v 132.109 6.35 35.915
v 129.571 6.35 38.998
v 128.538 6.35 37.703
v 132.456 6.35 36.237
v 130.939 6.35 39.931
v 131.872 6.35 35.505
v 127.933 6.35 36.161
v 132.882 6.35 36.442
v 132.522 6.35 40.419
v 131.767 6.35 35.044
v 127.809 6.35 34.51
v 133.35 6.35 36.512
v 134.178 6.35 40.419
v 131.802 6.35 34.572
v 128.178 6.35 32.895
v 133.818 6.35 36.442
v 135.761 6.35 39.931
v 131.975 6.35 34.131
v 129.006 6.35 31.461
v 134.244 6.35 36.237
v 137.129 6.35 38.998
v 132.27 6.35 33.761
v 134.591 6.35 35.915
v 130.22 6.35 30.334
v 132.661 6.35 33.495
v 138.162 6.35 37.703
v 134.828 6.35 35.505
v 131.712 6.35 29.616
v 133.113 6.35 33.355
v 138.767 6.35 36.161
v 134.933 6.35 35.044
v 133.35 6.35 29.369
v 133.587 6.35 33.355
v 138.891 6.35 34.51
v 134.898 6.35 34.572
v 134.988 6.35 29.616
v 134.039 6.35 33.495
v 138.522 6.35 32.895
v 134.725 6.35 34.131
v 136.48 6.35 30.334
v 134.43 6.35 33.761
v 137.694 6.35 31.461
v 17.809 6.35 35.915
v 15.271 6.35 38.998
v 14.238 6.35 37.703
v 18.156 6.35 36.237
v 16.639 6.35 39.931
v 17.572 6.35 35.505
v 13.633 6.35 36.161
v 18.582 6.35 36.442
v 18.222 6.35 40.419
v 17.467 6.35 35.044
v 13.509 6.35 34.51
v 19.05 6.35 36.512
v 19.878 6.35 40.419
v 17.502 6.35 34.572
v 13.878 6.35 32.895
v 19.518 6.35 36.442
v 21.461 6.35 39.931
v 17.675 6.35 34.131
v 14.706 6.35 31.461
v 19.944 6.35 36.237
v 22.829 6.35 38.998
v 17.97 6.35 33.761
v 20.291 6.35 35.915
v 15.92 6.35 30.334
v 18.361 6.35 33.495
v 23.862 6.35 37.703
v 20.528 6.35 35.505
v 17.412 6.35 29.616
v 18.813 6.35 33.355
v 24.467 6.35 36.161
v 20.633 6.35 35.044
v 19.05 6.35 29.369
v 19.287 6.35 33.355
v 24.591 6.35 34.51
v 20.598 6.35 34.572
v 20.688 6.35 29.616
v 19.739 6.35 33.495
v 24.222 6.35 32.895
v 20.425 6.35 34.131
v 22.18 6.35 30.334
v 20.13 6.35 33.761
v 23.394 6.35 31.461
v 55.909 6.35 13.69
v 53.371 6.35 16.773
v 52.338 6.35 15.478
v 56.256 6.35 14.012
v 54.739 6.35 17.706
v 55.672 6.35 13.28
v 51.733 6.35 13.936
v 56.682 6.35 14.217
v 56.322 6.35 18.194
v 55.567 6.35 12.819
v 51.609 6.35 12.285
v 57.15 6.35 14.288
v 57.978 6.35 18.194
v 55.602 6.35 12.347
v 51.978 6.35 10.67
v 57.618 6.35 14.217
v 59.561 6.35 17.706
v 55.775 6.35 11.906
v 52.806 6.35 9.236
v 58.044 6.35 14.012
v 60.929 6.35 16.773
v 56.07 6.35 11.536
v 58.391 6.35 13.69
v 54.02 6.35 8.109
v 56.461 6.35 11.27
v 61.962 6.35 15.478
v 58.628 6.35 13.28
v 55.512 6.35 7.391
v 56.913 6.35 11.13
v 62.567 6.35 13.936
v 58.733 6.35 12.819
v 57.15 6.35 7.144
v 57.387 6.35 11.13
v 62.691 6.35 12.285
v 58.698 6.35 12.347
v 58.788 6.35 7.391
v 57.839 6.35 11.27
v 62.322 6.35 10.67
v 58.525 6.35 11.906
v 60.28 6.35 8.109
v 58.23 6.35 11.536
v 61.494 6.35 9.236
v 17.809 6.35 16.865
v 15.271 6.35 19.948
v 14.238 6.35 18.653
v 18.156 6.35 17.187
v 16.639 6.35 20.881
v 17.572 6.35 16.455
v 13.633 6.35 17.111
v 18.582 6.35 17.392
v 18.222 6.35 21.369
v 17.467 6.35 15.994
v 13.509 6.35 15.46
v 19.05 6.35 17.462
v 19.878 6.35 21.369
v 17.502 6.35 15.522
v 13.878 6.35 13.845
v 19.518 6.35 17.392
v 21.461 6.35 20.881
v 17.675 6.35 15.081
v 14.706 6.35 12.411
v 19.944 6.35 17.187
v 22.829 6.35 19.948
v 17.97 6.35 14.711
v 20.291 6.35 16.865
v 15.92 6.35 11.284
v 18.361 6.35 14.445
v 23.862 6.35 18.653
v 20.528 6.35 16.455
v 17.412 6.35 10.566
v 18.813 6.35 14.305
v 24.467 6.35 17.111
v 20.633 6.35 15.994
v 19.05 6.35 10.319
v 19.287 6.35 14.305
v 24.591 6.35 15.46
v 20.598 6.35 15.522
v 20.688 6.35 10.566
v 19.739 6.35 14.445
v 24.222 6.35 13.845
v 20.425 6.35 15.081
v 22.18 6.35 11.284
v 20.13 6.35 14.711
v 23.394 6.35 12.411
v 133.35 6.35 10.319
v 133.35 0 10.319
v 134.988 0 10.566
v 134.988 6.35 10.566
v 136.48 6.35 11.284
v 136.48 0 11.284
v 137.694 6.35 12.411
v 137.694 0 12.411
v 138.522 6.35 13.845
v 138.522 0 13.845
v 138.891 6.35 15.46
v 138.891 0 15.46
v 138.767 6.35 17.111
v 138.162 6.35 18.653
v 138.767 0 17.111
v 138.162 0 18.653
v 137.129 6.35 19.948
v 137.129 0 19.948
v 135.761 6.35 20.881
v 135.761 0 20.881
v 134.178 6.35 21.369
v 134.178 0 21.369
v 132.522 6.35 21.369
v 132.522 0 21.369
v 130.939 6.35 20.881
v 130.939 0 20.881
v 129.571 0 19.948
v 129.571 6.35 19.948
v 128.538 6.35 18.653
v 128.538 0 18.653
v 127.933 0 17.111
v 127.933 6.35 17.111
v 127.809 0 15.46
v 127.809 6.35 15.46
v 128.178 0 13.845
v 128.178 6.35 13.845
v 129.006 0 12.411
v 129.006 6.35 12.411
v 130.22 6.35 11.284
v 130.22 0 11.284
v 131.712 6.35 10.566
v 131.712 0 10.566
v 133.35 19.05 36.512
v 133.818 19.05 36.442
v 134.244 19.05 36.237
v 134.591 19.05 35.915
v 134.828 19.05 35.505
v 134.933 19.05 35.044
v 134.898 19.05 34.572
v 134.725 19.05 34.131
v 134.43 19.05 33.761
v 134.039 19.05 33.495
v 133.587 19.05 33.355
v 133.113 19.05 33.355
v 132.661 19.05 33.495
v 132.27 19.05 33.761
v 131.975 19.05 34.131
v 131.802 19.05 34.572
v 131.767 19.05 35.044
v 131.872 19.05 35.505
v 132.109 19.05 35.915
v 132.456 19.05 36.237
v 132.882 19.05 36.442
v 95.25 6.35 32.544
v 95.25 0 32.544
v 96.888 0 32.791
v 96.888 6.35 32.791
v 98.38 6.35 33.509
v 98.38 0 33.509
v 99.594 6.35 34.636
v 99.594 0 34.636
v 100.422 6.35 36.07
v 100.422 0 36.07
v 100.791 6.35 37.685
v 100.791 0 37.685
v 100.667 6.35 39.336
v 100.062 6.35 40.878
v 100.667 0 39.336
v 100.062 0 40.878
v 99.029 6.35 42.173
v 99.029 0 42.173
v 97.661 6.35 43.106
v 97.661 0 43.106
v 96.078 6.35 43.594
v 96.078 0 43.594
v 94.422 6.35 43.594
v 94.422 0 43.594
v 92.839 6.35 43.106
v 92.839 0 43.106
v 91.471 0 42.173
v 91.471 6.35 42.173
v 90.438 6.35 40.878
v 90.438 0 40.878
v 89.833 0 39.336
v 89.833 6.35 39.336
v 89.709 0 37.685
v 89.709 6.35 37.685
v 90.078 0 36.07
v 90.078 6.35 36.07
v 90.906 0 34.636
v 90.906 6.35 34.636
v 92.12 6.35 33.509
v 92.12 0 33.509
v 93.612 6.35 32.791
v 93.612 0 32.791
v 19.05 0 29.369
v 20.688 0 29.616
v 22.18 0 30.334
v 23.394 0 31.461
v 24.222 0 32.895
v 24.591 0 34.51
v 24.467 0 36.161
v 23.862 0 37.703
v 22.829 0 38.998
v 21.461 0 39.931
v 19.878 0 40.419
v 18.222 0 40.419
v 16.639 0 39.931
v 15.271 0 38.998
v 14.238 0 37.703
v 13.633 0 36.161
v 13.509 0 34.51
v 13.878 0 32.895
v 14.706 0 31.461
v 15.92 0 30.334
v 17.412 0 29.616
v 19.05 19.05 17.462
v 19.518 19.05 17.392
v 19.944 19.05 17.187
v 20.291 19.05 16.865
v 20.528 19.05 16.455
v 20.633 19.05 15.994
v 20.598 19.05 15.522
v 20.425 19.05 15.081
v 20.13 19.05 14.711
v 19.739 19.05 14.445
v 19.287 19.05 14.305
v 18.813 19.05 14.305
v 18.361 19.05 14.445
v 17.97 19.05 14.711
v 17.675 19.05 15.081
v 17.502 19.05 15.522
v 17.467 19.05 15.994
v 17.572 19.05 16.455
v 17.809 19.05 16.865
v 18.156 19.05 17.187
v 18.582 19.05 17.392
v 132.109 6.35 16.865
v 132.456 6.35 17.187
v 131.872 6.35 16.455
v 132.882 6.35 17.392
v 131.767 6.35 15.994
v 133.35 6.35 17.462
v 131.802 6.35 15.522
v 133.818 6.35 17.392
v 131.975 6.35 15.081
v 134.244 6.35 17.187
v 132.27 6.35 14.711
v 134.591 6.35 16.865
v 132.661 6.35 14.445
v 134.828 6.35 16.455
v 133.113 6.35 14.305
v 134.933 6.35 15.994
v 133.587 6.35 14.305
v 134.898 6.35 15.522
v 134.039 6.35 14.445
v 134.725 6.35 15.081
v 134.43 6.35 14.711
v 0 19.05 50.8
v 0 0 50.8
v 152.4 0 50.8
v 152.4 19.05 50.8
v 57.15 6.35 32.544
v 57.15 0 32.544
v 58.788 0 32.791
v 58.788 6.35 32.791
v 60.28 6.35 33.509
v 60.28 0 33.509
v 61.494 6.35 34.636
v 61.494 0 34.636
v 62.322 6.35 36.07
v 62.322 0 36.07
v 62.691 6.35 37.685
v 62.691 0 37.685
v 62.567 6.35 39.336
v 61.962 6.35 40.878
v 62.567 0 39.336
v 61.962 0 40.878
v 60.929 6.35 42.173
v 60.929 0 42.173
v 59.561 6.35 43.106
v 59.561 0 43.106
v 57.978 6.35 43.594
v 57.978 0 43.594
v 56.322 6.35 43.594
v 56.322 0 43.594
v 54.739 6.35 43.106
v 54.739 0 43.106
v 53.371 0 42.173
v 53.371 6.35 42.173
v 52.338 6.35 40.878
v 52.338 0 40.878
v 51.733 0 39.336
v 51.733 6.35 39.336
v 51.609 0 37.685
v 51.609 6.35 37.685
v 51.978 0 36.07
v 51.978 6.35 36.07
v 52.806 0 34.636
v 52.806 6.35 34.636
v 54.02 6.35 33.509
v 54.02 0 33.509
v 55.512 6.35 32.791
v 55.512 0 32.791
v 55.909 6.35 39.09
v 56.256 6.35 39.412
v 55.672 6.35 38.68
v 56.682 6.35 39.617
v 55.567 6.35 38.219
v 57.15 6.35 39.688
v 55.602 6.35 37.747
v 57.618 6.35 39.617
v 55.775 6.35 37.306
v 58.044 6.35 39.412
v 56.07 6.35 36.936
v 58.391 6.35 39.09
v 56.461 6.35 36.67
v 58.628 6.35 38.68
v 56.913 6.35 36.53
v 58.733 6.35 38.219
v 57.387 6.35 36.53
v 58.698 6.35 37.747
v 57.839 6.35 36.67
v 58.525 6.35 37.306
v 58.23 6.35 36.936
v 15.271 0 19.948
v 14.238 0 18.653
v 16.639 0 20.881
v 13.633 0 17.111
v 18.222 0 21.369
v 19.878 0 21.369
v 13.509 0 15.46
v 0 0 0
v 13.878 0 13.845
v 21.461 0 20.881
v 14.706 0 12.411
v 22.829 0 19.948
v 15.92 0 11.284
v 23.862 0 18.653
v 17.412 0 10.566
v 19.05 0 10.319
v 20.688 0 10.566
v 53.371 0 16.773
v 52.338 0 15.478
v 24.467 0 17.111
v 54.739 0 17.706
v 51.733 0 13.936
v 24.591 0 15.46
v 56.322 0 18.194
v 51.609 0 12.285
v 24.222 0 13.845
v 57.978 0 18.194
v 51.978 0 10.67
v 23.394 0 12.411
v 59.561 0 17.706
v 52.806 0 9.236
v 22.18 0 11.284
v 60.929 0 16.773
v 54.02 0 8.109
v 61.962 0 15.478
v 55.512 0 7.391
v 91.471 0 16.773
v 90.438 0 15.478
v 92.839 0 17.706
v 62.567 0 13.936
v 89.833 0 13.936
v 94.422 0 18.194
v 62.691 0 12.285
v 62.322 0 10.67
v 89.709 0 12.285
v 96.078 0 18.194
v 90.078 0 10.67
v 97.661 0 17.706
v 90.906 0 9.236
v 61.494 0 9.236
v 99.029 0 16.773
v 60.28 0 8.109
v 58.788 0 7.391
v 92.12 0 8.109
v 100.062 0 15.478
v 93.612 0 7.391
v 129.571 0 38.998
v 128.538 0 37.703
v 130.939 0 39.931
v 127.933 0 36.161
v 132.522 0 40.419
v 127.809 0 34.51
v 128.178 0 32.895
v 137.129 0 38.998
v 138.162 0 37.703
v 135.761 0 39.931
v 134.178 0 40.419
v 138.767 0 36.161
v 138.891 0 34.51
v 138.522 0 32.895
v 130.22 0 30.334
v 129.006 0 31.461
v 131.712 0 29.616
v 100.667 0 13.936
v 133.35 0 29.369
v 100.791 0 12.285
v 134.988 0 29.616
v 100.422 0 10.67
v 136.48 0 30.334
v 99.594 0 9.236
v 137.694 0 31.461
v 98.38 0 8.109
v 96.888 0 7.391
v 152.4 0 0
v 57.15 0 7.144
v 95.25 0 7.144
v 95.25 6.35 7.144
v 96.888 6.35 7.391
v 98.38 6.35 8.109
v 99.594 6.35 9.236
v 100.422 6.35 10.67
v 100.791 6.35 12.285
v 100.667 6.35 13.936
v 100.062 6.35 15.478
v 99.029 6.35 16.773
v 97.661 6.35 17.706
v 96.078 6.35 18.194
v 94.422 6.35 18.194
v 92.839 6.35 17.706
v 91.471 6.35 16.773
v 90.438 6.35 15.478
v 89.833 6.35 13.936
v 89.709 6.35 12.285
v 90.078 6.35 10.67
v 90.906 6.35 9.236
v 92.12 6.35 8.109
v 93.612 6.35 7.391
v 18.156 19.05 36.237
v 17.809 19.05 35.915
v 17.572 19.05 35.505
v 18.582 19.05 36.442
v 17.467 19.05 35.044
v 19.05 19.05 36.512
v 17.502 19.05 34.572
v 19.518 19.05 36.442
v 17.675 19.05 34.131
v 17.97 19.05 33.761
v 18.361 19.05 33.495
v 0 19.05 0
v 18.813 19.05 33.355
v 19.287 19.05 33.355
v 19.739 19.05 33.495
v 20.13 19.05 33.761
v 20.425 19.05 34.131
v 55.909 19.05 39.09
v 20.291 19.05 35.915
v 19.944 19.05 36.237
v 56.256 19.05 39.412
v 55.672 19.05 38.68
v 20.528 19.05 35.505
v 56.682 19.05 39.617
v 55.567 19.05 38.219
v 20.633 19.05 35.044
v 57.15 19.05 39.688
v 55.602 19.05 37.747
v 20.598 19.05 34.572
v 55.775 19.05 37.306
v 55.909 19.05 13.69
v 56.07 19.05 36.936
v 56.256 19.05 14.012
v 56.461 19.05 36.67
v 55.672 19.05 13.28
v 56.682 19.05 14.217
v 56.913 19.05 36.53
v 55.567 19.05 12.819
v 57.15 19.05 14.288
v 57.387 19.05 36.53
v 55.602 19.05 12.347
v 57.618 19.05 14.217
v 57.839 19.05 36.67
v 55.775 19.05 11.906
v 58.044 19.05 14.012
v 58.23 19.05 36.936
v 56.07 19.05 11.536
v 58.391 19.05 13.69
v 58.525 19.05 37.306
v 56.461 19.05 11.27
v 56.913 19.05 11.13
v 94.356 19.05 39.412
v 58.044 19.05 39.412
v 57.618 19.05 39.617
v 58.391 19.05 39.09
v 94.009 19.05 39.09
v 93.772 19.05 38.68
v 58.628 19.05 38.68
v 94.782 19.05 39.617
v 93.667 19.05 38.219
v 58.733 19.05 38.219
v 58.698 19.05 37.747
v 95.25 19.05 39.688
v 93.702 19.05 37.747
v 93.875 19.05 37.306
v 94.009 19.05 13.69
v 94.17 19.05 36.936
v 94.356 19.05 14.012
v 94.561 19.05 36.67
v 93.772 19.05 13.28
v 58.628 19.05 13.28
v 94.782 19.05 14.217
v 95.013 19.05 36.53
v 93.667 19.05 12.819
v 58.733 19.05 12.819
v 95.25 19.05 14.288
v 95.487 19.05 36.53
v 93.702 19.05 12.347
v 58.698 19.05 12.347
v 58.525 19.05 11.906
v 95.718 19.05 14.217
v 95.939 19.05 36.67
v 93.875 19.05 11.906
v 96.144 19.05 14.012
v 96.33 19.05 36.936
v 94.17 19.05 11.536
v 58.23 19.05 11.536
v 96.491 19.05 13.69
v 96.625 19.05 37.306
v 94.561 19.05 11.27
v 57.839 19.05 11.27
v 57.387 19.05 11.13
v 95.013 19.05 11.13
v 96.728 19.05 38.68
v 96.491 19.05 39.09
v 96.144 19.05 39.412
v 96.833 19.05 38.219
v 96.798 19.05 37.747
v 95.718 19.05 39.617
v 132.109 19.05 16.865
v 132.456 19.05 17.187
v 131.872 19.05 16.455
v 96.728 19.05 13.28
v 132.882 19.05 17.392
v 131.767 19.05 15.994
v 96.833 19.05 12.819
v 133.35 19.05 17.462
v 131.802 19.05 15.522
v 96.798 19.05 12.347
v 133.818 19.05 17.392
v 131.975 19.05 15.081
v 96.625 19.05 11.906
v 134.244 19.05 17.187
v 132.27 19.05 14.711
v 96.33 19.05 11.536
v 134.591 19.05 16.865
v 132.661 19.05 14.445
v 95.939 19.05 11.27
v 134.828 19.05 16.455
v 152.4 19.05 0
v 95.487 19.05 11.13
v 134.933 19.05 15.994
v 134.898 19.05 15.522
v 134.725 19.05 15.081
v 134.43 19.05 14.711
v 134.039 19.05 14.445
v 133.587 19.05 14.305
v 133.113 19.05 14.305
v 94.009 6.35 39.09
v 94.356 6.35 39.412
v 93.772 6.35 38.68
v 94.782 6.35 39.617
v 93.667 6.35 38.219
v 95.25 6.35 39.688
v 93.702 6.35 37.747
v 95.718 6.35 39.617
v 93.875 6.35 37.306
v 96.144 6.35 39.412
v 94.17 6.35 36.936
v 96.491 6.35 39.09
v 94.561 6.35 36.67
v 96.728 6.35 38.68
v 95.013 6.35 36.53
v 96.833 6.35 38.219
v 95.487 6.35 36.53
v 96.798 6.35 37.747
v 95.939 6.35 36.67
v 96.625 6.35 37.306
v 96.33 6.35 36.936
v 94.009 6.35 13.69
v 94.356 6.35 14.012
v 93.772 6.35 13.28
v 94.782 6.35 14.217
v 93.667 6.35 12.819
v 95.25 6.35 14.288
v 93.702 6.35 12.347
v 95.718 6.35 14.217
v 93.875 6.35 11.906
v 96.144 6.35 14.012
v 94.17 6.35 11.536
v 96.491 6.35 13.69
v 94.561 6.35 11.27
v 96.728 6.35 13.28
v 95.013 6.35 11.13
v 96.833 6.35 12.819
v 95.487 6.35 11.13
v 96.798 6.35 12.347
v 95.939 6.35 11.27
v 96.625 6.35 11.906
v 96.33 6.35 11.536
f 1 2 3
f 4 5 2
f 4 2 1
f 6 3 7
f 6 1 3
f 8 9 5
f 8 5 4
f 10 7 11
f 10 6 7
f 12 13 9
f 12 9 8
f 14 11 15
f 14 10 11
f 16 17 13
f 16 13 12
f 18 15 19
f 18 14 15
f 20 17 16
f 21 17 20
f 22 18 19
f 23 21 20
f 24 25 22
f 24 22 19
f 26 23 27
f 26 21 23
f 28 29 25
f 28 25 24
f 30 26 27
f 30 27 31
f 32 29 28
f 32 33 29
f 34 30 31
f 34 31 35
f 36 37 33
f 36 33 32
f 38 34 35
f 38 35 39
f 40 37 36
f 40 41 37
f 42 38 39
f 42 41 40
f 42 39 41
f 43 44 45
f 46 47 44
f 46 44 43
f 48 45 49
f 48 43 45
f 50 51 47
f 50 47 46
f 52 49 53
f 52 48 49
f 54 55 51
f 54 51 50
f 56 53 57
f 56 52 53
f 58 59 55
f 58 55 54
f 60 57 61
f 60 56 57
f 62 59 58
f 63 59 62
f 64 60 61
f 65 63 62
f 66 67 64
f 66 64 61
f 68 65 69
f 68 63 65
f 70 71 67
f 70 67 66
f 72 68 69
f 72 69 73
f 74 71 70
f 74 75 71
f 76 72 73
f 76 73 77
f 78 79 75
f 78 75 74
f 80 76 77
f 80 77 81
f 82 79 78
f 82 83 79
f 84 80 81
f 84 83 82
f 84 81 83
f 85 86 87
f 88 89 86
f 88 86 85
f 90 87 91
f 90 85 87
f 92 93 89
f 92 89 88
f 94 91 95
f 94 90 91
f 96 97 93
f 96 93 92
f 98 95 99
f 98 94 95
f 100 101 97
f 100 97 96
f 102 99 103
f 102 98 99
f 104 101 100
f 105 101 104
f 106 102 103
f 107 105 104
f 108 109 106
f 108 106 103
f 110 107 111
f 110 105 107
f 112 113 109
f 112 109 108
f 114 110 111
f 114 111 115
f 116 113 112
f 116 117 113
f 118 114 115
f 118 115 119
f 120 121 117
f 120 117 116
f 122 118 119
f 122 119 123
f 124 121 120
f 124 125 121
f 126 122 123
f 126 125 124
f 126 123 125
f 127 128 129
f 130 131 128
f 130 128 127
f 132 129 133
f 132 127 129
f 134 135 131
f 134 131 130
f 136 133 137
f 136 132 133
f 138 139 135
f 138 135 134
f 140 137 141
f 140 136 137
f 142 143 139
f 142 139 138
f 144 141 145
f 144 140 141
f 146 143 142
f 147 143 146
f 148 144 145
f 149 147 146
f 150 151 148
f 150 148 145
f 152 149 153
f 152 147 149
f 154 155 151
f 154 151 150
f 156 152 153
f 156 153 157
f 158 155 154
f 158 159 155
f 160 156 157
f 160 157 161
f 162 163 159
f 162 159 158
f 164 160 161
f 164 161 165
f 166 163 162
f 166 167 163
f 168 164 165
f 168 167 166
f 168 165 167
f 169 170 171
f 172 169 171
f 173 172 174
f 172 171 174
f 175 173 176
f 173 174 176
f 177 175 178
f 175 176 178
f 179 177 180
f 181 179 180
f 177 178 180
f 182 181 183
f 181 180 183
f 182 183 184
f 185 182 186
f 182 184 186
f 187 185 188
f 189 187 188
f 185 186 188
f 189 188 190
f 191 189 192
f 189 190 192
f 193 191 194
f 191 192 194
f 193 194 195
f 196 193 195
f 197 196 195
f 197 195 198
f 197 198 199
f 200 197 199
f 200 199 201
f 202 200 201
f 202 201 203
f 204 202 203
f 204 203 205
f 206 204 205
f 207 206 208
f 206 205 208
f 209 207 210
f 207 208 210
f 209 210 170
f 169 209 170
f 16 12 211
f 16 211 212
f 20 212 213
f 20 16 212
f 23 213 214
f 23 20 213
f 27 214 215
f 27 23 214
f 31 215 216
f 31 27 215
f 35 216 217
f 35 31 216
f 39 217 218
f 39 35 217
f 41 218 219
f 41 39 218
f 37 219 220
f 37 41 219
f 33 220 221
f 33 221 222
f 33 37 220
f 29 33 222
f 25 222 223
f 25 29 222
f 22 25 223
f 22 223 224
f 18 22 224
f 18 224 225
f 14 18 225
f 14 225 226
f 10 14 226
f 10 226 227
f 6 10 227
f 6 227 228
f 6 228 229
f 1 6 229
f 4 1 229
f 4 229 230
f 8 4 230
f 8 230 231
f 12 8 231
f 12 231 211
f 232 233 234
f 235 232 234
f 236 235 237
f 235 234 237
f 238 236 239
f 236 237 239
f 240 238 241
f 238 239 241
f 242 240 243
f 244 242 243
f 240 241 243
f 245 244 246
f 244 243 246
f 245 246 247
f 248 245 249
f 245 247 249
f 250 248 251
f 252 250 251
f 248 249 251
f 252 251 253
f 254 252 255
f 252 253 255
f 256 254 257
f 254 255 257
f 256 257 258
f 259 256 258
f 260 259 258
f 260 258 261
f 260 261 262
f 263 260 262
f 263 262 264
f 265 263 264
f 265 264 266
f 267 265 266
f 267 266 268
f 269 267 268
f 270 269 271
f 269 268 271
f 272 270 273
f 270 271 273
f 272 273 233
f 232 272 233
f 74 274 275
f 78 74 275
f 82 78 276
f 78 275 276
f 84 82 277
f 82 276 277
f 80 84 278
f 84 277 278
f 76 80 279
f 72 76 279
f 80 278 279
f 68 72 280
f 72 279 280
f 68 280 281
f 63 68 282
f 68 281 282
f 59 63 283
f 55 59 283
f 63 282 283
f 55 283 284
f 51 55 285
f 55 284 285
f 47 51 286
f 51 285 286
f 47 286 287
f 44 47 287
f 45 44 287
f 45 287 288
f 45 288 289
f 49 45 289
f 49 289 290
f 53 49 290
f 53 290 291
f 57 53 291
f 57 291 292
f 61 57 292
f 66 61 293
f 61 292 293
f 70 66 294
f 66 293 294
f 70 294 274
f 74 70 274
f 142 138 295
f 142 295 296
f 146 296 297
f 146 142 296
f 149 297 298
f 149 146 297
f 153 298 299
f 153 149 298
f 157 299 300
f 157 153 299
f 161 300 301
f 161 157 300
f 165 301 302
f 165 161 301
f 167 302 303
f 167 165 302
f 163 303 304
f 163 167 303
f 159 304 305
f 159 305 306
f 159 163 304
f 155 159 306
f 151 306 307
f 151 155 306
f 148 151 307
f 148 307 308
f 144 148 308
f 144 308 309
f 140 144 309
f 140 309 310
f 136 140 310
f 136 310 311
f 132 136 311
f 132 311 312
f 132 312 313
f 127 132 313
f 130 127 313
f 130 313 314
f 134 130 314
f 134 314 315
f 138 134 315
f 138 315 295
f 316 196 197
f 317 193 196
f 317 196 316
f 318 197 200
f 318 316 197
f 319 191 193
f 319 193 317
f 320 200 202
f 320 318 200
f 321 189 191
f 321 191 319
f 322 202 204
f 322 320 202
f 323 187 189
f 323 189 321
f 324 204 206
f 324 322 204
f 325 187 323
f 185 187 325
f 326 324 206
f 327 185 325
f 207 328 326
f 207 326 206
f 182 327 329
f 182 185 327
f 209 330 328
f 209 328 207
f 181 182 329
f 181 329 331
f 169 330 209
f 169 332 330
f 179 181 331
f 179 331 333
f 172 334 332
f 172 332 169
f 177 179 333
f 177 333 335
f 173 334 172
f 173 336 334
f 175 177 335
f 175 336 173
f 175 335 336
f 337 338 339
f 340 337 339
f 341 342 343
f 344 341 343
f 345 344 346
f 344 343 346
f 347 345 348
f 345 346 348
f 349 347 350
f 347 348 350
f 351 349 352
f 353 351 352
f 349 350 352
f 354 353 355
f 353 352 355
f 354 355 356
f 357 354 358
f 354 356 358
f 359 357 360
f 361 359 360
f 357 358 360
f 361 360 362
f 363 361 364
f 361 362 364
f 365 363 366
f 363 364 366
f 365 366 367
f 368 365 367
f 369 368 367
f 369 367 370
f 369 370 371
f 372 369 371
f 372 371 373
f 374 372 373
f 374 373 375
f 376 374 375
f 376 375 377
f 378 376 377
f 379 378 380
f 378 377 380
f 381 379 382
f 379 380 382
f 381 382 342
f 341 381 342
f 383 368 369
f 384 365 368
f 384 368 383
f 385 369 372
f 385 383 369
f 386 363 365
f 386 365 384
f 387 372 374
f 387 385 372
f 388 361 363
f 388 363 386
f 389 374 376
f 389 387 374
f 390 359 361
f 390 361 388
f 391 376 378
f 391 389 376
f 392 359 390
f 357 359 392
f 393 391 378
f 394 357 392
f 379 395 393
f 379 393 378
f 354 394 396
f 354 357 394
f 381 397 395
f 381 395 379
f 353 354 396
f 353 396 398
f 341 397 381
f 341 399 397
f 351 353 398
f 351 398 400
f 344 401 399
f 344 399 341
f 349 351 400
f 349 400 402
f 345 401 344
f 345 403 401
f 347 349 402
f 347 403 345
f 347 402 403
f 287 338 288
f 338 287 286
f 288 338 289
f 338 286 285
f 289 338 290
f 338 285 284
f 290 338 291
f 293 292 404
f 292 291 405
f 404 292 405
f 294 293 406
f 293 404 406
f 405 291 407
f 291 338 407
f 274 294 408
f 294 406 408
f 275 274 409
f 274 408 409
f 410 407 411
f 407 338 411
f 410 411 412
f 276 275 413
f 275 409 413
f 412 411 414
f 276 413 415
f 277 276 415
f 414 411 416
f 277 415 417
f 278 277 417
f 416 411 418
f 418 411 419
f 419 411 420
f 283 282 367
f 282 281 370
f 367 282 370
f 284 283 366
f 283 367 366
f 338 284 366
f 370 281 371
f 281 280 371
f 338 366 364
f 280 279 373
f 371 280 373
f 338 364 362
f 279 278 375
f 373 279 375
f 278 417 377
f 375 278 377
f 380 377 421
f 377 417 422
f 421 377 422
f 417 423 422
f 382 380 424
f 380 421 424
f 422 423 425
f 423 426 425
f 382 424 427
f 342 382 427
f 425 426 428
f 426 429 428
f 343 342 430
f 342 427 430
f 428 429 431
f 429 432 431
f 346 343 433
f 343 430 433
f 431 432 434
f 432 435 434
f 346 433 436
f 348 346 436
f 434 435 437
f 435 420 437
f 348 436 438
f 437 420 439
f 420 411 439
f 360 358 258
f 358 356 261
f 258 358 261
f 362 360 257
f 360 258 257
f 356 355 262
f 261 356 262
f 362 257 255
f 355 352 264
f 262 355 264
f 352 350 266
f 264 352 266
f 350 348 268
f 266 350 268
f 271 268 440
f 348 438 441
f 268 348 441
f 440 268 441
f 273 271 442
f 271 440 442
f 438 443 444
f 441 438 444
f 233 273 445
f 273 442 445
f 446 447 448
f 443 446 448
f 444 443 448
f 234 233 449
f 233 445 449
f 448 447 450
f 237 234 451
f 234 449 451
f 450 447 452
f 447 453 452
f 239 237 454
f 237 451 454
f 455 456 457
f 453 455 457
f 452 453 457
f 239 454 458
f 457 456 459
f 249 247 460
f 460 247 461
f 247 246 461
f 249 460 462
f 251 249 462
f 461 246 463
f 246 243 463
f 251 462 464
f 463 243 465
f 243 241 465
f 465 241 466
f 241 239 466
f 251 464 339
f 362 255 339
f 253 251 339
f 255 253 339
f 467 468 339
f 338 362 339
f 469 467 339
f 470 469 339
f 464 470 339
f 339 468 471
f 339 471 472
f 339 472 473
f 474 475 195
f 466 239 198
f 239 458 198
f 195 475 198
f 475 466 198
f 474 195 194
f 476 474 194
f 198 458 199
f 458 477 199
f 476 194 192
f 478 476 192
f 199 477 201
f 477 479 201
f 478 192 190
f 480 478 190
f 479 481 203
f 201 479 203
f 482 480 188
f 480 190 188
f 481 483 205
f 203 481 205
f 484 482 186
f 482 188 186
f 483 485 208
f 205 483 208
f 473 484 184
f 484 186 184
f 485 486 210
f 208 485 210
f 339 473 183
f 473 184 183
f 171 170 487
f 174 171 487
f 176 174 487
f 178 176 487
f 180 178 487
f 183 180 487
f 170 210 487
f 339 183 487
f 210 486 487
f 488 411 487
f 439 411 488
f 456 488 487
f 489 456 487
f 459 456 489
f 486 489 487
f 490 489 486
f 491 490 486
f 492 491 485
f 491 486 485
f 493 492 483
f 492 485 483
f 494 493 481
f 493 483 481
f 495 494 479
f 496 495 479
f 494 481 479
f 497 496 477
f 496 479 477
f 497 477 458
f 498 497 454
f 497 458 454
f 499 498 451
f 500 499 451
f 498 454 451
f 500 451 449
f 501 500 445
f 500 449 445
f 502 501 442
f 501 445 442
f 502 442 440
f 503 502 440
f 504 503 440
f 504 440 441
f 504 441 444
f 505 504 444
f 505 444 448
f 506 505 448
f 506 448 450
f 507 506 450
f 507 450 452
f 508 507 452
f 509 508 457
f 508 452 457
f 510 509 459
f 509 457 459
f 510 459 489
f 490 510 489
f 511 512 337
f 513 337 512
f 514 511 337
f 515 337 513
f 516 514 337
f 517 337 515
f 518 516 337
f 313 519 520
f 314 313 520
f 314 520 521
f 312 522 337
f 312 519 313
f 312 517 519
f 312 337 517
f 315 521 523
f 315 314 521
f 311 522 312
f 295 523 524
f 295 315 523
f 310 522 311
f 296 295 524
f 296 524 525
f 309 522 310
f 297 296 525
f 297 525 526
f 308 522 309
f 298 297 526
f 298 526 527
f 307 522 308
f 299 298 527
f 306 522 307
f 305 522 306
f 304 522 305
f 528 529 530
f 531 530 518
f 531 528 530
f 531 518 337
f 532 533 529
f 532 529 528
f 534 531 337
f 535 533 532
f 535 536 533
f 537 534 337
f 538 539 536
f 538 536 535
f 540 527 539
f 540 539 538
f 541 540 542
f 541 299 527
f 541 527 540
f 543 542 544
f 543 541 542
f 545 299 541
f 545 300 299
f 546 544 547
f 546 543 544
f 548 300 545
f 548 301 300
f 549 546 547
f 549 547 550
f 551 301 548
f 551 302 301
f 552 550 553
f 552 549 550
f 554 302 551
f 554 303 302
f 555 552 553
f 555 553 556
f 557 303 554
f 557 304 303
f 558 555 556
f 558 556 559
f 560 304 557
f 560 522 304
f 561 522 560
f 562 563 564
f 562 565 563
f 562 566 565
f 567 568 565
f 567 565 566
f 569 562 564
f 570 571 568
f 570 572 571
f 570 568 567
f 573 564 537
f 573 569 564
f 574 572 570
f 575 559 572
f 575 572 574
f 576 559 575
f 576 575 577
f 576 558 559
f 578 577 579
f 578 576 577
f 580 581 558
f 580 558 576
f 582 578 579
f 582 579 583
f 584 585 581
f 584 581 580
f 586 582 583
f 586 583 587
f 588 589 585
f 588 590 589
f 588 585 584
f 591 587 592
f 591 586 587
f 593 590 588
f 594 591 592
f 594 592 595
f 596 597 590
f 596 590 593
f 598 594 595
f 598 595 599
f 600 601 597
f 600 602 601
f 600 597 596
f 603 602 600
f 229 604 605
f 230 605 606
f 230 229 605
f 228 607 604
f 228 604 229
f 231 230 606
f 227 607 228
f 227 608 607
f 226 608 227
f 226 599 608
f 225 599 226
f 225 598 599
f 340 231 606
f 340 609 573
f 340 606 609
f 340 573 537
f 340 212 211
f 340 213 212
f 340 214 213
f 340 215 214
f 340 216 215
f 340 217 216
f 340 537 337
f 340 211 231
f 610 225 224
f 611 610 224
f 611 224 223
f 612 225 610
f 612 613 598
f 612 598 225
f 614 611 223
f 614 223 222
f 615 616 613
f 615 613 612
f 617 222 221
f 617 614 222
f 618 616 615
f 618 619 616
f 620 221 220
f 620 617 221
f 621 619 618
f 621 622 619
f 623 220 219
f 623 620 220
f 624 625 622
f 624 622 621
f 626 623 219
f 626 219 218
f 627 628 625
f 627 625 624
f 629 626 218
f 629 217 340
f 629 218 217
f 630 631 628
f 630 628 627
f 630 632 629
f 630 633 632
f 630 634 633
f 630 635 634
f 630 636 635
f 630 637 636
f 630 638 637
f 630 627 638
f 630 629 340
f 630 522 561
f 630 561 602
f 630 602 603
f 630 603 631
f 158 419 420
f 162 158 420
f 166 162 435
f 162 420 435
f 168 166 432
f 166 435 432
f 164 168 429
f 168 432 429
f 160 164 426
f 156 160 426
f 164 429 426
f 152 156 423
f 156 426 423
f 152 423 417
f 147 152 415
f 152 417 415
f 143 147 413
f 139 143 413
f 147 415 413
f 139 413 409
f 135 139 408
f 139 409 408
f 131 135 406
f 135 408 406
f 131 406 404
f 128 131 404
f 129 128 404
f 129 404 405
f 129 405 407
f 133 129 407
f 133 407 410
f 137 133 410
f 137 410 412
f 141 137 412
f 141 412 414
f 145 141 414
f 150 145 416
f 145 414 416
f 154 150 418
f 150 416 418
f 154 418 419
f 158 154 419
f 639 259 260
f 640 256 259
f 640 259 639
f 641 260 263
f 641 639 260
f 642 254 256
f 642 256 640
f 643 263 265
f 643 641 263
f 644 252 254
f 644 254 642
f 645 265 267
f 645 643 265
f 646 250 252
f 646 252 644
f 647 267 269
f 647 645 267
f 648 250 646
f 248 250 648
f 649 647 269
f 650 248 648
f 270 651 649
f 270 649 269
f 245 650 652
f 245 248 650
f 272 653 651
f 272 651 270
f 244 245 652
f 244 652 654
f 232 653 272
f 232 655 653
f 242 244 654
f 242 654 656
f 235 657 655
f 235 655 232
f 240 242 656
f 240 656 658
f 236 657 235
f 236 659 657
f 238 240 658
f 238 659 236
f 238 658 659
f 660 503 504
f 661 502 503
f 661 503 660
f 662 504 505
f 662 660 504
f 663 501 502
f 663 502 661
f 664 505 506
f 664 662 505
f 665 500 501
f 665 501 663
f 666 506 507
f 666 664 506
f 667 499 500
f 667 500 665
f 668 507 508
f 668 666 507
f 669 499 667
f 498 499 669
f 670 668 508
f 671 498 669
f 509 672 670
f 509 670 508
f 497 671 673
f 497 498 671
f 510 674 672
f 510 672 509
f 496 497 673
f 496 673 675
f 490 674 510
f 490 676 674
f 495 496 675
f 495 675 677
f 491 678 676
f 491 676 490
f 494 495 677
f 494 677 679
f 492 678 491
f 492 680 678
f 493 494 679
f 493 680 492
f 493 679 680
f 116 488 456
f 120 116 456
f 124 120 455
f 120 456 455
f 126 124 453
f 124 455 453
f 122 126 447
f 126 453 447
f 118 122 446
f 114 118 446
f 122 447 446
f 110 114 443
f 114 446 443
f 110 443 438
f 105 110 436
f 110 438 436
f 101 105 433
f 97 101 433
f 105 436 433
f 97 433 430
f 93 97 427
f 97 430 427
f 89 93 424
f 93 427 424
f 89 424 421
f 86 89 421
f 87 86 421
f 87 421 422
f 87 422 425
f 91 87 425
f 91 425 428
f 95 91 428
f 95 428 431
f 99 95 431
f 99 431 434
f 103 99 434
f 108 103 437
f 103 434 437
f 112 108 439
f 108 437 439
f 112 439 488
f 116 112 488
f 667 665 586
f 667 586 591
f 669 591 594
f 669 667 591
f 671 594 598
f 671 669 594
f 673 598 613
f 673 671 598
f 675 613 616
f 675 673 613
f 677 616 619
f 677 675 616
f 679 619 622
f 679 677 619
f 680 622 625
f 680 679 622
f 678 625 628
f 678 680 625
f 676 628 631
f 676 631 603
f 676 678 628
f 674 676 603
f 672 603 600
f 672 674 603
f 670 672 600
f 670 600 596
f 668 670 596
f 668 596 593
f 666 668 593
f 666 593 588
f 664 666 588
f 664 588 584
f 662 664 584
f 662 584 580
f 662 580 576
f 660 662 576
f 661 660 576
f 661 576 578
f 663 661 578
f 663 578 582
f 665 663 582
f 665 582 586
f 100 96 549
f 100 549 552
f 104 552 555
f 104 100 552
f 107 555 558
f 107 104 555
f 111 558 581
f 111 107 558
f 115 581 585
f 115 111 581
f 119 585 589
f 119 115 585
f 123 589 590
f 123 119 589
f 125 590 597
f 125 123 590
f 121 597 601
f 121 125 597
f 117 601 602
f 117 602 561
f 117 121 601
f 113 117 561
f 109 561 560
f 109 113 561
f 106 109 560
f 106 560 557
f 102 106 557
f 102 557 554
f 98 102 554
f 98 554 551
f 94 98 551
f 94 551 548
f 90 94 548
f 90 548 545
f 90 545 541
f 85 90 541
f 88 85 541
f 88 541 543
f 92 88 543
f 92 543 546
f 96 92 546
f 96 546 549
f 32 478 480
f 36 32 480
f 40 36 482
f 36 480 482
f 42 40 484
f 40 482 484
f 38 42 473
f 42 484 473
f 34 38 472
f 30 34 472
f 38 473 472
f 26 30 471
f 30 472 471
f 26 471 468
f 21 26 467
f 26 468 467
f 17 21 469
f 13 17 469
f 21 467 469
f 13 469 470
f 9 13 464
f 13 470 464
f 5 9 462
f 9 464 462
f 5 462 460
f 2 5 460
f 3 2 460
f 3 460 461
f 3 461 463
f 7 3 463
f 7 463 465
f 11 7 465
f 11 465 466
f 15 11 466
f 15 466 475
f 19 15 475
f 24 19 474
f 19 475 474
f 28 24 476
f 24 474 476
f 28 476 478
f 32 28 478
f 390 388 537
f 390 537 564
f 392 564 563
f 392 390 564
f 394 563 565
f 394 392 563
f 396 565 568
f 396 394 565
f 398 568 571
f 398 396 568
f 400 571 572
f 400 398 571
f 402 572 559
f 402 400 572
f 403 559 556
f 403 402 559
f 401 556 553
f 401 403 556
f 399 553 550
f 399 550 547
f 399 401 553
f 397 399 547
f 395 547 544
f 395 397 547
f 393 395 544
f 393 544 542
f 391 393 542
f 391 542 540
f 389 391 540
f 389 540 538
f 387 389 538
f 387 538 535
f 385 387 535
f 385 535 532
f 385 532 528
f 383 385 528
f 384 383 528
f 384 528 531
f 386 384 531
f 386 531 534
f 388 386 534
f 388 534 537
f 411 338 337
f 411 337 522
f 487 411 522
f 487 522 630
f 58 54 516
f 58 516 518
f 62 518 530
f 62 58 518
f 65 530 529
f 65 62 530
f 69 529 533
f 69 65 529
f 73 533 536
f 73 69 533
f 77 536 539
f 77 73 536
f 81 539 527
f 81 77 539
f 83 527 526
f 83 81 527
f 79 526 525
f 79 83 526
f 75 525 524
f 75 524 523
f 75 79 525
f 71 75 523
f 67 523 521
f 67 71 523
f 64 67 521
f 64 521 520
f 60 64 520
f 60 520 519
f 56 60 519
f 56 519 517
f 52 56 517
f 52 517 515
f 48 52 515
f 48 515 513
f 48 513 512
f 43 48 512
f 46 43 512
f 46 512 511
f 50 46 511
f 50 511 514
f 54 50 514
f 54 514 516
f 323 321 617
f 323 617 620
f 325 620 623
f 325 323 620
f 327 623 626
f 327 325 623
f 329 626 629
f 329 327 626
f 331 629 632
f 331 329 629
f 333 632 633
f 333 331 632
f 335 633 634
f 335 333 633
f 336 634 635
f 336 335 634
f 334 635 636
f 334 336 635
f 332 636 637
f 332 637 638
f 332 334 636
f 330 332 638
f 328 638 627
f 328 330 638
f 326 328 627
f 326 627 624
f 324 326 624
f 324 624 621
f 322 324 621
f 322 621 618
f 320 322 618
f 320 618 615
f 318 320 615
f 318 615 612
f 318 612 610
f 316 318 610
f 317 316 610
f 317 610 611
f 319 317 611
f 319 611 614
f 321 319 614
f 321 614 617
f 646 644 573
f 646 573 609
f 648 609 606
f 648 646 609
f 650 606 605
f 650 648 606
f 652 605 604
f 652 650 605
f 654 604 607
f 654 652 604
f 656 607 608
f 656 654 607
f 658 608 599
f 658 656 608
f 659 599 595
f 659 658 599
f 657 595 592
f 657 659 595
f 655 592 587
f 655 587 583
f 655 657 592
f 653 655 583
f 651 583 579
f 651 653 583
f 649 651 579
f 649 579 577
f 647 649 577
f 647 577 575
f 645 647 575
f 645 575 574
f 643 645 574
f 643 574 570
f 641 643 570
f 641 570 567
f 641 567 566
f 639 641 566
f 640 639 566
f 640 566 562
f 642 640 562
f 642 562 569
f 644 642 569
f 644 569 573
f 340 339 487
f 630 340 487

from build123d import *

# Parameters (mm, degrees)
SKETCH1_W           = 152.4
SKETCH1_H           = 50.8
SKETCH1_R           = 1.5875
BOSS_EXTRUDE1_DEPTH = 19.05
SKETCH2_R           = 5.55625
CUT_EXTRUDE1_DEPTH  = 6.35


with BuildPart() as part:
    # Sketch1 → Boss-Extrude1 (new body)
    with BuildSketch(Plane(origin=(0, 0, 0), x_dir=(1, 0, 0), z_dir=(0, 1, 0))):
        with Locations((76.2, -25.4)):
            Rectangle(SKETCH1_W, SKETCH1_H)
        with Locations(Location((57.15, -12.7, 0), (0, 0, 270))):  # turned: the seam where the file's is
            Circle(SKETCH1_R, mode=Mode.SUBTRACT)
        with Locations(Location((57.15, -38.1, 0), (0, 0, 270))):  # turned: the seam where the file's is
            Circle(SKETCH1_R, mode=Mode.SUBTRACT)
        with Locations(Location((95.25, -12.7, 0), (0, 0, 270))):  # turned: the seam where the file's is
            Circle(SKETCH1_R, mode=Mode.SUBTRACT)
        with Locations(Location((95.25, -38.1, 0), (0, 0, 270))):  # turned: the seam where the file's is
            Circle(SKETCH1_R, mode=Mode.SUBTRACT)
        with Locations(Location((19.05, -15.875, 0), (0, 0, 270))):  # turned: the seam where the file's is
            Circle(SKETCH1_R, mode=Mode.SUBTRACT)
        with Locations(Location((19.05, -34.925, 0), (0, 0, 270))):  # turned: the seam where the file's is
            Circle(SKETCH1_R, mode=Mode.SUBTRACT)
        with Locations(Location((133.35, -15.875, 0), (0, 0, 270))):  # turned: the seam where the file's is
            Circle(SKETCH1_R, mode=Mode.SUBTRACT)
        with Locations(Location((133.35, -34.925, 0), (0, 0, 270))):  # turned: the seam where the file's is
            Circle(SKETCH1_R, mode=Mode.SUBTRACT)
    extrude(amount=BOSS_EXTRUDE1_DEPTH)

    # Sketch2 → Cut-Extrude1 (cut)
    with BuildSketch(Plane(origin=(0, 0, 0), x_dir=(-1, 0, 0), z_dir=(0, -1, 0))):
        with Locations(Location((-19.05, -34.925, 0), (0, 0, 90))):  # turned: the seam where the file's is
            Circle(SKETCH2_R)
        with Locations(Location((-19.05, -15.875, 0), (0, 0, 90))):  # turned: the seam where the file's is
            Circle(SKETCH2_R)
        with Locations(Location((-57.15, -38.1, 0), (0, 0, 90))):  # turned: the seam where the file's is
            Circle(SKETCH2_R)
        with Locations(Location((-57.15, -12.7, 0), (0, 0, 90))):  # turned: the seam where the file's is
            Circle(SKETCH2_R)
        with Locations(Location((-95.25, -38.1, 0), (0, 0, 90))):  # turned: the seam where the file's is
            Circle(SKETCH2_R)
        with Locations(Location((-95.25, -12.7, 0), (0, 0, 90))):  # turned: the seam where the file's is
            Circle(SKETCH2_R)
        with Locations(Location((-133.35, -15.875, 0), (0, 0, 90))):  # turned: the seam where the file's is
            Circle(SKETCH2_R)
        with Locations(Location((-133.35, -34.925, 0), (0, 0, 90))):  # turned: the seam where the file's is
            Circle(SKETCH2_R)
    extrude(amount=-CUT_EXTRUDE1_DEPTH, mode=Mode.SUBTRACT)


solid = part.part
